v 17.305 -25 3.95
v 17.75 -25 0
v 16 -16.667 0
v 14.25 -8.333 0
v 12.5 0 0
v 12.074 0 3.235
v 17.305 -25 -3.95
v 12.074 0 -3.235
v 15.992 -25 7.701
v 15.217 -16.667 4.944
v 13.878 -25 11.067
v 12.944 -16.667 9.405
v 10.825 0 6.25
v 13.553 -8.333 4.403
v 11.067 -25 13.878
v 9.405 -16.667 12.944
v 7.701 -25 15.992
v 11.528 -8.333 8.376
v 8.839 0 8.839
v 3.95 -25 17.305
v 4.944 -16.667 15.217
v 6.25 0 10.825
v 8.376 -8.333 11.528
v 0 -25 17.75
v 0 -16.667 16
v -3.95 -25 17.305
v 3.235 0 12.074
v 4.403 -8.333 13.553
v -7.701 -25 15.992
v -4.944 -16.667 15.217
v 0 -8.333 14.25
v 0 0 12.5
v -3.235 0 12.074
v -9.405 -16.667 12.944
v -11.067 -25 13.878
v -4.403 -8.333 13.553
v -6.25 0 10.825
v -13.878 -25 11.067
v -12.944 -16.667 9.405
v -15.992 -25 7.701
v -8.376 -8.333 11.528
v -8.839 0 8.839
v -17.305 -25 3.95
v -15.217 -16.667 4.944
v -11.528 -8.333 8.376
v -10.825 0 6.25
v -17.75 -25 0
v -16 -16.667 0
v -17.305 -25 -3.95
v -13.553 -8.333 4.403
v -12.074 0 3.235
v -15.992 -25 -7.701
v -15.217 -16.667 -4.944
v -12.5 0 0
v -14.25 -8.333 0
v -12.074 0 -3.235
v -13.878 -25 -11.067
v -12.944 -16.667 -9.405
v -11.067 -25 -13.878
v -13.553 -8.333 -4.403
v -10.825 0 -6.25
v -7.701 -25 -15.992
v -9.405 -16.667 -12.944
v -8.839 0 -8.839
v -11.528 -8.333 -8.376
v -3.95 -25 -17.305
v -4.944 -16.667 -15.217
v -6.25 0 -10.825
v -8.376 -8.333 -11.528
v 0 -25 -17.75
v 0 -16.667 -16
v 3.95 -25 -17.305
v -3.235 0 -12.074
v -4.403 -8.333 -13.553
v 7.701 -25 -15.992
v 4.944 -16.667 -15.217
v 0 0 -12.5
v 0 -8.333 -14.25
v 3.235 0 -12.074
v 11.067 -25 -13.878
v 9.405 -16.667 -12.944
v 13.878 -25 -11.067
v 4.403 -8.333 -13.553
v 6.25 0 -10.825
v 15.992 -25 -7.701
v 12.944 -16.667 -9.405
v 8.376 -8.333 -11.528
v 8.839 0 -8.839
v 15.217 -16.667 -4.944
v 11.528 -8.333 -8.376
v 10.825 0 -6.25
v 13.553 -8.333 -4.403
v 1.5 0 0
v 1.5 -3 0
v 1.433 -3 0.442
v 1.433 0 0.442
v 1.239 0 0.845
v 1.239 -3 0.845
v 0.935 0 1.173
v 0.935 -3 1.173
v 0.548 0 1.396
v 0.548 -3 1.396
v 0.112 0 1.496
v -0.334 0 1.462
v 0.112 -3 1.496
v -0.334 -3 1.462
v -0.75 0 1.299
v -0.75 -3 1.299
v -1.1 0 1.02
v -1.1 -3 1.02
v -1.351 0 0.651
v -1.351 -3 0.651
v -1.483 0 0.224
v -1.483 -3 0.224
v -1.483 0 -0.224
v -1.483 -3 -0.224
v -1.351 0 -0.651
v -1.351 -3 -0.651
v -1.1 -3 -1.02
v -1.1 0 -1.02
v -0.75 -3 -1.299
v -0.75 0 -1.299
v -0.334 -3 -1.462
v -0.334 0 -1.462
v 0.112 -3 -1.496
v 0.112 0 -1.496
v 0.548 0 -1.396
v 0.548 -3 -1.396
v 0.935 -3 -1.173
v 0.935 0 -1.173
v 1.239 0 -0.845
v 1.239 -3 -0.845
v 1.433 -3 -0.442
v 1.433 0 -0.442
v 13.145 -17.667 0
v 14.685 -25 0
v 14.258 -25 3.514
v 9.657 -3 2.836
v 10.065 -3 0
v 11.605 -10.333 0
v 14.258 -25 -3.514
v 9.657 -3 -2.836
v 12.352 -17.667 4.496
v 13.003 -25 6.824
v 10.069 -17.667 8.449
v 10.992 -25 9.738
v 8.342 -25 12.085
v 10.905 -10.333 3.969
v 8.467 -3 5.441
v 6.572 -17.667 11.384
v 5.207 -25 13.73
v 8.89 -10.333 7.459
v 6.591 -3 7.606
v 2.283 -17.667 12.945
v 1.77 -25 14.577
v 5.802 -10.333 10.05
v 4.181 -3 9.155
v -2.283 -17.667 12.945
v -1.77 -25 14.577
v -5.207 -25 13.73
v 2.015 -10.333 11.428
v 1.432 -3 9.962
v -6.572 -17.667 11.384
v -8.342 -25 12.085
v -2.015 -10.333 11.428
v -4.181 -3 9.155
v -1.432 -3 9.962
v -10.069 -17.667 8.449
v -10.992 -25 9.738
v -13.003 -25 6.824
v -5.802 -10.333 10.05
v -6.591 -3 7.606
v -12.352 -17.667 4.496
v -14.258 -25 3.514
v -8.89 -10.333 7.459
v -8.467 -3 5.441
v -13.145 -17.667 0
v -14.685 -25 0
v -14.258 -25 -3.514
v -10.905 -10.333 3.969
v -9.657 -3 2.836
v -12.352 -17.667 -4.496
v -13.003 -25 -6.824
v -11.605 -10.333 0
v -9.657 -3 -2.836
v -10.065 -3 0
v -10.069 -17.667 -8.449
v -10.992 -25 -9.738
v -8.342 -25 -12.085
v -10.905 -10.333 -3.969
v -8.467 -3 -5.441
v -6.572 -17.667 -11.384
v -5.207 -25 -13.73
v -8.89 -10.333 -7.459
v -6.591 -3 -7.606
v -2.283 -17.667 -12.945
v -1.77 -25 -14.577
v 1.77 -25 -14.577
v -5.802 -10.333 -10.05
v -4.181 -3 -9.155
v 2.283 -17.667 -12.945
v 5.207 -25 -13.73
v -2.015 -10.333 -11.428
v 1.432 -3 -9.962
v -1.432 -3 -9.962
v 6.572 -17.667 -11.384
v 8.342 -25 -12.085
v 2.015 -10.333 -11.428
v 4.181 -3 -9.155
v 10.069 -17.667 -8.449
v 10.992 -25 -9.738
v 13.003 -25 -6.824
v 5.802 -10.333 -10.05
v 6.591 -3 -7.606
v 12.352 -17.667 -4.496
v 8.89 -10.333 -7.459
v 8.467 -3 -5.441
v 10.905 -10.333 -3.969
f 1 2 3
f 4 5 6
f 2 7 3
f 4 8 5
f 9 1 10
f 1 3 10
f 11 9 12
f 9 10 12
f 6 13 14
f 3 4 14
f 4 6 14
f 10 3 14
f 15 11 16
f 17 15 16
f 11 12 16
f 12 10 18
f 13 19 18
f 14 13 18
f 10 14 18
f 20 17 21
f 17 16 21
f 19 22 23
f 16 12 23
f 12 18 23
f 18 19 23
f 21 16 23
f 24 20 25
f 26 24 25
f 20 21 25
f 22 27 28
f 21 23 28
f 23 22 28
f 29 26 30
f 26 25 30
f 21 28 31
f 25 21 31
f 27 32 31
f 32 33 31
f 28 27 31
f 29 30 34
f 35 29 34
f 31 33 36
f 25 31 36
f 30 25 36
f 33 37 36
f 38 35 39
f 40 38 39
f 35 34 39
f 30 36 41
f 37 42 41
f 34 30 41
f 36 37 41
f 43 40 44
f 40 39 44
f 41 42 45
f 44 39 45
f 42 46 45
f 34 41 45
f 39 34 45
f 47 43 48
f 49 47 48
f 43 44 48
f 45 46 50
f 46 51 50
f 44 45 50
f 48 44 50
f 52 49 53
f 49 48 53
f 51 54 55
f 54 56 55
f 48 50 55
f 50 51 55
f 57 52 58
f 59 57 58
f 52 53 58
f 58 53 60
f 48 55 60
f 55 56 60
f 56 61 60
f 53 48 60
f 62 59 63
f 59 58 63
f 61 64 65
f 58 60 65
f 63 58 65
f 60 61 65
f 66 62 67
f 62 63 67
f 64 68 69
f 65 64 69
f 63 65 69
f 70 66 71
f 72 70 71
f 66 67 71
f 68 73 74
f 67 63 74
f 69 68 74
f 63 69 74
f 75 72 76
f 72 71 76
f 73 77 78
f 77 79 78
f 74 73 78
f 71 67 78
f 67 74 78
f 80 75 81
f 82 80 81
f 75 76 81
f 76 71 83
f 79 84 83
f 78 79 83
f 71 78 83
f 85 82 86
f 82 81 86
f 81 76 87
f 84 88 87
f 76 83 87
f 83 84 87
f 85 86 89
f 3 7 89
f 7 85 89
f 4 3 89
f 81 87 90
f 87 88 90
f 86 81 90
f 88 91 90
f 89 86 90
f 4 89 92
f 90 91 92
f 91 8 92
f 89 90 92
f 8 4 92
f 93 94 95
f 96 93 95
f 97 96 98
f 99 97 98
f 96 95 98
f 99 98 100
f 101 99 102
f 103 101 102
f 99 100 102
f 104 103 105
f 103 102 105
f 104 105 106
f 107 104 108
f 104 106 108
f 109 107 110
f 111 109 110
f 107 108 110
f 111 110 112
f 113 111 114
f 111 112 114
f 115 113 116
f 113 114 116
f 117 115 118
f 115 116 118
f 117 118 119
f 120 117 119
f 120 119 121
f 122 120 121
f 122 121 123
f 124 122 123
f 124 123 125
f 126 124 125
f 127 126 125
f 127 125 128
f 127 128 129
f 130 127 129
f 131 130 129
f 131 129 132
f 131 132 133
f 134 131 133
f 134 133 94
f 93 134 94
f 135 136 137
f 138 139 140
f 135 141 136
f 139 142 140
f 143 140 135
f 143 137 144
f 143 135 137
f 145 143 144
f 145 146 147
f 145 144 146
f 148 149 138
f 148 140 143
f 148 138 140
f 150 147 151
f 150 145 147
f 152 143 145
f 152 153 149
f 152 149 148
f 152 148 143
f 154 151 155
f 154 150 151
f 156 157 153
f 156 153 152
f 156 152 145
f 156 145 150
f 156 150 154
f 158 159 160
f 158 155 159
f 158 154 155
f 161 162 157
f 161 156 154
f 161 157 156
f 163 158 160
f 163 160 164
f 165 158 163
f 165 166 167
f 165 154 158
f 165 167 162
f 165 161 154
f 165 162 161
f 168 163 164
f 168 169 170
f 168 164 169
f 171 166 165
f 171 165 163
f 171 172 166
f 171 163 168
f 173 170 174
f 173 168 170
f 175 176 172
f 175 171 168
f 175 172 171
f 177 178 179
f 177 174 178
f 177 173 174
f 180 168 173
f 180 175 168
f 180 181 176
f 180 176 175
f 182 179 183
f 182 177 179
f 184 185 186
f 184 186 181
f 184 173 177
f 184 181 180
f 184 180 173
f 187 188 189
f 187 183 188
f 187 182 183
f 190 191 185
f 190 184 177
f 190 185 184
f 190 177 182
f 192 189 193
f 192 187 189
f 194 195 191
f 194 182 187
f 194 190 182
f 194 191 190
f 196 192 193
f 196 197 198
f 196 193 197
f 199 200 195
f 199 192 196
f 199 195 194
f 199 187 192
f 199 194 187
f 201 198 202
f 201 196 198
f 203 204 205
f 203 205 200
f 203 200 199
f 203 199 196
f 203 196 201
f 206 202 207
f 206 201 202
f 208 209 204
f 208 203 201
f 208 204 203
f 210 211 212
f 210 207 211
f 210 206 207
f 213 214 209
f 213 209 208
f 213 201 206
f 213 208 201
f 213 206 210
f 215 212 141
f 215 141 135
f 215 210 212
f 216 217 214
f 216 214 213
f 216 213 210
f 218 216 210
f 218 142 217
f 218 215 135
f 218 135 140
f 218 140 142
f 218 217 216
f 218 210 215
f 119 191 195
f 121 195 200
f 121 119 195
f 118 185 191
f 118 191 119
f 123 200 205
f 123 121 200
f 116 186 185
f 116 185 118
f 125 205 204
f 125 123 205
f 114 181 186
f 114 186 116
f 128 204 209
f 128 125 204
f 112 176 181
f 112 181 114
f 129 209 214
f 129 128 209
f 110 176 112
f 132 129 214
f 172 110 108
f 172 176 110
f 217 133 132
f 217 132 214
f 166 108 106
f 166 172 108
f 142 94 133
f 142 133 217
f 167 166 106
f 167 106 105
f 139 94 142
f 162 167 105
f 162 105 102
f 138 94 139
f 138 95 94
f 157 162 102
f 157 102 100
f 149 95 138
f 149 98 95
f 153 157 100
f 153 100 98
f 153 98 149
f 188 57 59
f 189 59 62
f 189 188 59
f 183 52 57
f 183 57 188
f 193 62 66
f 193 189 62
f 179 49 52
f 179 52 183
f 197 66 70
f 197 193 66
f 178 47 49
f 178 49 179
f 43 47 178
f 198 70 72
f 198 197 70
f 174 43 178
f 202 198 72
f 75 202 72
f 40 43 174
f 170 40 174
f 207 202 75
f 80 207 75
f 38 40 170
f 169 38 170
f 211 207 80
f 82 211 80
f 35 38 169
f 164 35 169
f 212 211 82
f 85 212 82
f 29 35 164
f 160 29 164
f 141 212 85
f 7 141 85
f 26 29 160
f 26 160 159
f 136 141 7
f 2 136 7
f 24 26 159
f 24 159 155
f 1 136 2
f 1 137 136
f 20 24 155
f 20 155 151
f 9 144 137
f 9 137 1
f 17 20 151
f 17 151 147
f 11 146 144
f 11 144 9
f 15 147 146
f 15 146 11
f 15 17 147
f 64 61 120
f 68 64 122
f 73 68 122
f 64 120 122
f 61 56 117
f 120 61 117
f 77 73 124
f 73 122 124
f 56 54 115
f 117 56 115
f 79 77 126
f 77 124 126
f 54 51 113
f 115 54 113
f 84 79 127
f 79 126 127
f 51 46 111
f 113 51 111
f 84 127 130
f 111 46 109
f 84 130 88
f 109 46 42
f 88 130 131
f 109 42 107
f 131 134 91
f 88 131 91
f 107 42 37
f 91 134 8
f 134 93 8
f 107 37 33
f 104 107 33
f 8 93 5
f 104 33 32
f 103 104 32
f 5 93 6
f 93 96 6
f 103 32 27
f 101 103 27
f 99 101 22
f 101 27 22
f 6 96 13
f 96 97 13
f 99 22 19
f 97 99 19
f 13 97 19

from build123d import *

# Parameters (mm, degrees)
F2_R = 17.75
F0_R = 12.5
F4_T = -3
F7_D = 3


with BuildPart() as f3:
    # F2 (on offset) → F3 section 0
    with BuildSketch(Plane.XZ.offset(25)):
        Circle(F2_R)
    # F0 (on Front) → F3 section 1
    with BuildSketch(Plane.XZ):
        Circle(F0_R)
    loft()

    # F4
    f4_openings = [f3.faces().sort_by_distance(p)[0] for p in [
        (0, -25, 0),
    ]]
    offset(amount=F4_T, openings=f4_openings, kind=Kind.INTERSECTION)

    # F7 (through all)
    with Locations(Plane(origin=(0, 0, 0), x_dir=(-1, 0, 0), z_dir=(0, 1, 0))):
        with Locations((0, 0)):
            Hole(F7_D / 2)


solid = f3.part
